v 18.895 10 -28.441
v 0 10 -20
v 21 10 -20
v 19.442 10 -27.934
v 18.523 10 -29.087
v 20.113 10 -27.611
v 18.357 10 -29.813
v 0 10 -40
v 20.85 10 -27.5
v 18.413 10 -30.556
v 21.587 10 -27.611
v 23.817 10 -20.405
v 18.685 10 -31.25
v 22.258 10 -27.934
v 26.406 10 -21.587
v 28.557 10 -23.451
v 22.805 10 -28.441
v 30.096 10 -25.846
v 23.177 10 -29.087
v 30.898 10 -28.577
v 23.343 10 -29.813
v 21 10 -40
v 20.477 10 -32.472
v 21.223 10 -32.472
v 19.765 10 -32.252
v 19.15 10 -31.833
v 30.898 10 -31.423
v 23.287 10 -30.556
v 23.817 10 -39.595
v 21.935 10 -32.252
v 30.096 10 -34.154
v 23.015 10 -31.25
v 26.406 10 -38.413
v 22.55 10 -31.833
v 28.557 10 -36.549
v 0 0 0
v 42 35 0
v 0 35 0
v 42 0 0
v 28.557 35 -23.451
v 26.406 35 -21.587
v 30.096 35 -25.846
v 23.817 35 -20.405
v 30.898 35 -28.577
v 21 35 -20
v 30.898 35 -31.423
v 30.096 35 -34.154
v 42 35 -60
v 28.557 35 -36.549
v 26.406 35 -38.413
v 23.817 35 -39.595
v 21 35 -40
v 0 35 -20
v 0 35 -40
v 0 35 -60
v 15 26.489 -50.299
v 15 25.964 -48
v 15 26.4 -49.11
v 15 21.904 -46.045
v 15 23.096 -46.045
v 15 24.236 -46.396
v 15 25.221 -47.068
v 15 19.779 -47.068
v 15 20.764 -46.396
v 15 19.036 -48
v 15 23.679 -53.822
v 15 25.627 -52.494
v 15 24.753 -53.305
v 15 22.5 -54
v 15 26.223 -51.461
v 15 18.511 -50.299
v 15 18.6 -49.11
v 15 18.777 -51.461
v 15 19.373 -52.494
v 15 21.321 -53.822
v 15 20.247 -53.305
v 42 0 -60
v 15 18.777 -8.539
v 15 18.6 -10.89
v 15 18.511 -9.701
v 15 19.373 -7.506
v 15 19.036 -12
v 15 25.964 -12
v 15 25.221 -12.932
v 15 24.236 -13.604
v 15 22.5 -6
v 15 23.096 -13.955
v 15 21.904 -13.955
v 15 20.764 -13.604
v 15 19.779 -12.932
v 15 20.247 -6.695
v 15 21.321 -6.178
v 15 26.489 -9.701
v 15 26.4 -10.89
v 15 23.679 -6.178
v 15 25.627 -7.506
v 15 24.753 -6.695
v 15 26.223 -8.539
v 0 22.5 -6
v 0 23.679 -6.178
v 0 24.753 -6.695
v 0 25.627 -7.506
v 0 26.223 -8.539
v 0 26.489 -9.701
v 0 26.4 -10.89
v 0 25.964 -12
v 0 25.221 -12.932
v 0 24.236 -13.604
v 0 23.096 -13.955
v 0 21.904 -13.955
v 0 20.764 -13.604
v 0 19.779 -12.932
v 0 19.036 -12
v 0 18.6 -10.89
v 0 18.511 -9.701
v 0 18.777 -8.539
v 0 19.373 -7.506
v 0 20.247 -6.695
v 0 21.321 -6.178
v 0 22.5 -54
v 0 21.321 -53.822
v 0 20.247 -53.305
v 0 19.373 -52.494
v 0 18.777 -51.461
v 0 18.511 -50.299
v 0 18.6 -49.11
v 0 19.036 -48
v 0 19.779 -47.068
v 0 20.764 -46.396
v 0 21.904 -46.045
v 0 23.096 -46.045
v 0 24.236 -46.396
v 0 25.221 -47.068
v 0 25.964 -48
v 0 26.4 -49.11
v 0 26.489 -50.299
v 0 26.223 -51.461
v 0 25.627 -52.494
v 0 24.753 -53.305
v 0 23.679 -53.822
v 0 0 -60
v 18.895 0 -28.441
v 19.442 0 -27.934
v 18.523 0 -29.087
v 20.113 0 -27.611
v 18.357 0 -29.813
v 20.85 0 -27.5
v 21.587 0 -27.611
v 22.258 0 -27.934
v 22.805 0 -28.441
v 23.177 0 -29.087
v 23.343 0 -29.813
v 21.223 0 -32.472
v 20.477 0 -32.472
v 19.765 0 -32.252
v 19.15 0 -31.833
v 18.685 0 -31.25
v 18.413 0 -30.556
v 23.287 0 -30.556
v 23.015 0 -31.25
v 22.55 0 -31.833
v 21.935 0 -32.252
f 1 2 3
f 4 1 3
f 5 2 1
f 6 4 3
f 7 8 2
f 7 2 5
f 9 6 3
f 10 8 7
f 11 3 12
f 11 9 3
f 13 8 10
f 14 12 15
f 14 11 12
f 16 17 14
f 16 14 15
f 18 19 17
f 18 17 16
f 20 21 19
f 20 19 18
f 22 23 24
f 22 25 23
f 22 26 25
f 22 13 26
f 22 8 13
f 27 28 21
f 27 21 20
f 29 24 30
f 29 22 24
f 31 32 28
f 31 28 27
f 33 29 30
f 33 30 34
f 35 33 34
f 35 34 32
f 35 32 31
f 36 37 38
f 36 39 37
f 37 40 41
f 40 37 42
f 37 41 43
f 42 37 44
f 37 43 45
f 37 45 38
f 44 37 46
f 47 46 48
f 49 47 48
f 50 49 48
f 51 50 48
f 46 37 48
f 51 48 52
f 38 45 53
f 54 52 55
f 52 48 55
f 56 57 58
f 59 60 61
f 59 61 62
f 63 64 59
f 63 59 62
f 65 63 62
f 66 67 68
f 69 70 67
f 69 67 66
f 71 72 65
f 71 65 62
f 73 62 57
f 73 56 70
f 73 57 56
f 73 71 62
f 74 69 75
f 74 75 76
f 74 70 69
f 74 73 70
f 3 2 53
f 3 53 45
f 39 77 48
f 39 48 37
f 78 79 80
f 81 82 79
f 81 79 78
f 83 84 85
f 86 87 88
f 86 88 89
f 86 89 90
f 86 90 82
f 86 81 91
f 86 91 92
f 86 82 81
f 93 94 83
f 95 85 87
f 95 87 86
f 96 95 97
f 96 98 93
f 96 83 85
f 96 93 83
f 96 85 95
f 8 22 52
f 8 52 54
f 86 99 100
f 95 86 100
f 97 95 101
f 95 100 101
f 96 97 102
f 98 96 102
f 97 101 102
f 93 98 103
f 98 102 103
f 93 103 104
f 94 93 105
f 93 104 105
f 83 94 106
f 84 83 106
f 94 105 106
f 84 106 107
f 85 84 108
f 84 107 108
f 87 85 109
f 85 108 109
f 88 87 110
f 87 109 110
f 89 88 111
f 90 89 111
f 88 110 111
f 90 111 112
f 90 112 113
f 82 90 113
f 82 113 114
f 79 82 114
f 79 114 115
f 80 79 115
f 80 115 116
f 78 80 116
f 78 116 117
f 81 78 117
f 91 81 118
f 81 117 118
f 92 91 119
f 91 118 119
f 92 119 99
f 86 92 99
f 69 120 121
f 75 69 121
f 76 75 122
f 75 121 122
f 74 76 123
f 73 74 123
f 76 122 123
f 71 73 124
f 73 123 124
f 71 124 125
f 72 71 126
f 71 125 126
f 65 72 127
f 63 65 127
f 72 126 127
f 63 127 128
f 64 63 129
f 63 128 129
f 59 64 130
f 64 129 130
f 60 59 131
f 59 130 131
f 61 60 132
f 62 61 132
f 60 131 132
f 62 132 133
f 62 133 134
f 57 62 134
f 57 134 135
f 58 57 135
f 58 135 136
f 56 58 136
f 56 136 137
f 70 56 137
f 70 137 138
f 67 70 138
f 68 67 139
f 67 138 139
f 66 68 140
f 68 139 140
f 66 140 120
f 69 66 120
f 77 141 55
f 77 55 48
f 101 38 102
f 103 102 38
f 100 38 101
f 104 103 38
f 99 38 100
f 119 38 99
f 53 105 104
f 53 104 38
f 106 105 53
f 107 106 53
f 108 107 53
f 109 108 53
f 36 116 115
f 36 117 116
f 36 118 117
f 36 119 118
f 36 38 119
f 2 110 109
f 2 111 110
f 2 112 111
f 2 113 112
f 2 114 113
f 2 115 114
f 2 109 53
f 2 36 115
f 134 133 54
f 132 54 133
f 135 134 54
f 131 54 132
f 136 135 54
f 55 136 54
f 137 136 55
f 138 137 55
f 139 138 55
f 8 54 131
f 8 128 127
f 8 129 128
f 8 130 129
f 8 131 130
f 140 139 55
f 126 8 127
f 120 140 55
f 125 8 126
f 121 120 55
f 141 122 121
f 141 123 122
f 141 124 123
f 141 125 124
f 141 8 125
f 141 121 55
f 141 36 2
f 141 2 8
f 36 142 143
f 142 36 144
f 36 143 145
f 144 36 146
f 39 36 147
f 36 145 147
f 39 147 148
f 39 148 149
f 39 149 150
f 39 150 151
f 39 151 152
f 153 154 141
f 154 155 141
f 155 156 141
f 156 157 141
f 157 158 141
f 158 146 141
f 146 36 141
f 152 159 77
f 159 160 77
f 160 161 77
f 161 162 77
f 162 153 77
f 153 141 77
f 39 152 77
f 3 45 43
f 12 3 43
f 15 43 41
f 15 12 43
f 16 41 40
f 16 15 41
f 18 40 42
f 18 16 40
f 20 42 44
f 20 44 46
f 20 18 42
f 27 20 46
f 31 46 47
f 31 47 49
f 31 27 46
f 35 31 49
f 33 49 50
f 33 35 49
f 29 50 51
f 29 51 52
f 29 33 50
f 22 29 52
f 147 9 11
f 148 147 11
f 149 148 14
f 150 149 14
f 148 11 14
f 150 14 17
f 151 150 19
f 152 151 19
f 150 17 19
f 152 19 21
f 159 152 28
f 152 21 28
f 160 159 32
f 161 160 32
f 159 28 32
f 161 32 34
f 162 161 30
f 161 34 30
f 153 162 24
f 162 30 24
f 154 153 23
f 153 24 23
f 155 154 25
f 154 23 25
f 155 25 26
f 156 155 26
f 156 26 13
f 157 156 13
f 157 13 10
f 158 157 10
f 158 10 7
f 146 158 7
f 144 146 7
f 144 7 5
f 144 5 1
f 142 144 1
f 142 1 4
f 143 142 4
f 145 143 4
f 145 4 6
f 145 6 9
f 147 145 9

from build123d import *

# Parameters (mm, degrees)
SKETCH1_W           = 42
SKETCH1_H           = 60
BOSS_EXTRUDE1_DEPTH = 10
BOSS_EXTRUDE2_DEPTH = 25
SKETCH3_R           = 4
CUT_EXTRUDE1_DEPTH  = 15
SKETCH4_R           = 2.5
CUT_EXTRUDE2_DEPTH  = 15


with BuildPart() as part:
    # Sketch1 → Boss-Extrude1 (new body)
    with BuildSketch(Plane(origin=(0, 0, 0), x_dir=(1, 0, 0), z_dir=(0, 1, 0))):
        with Locations((21, 30)):
            Rectangle(SKETCH1_W, SKETCH1_H)
    extrude(amount=BOSS_EXTRUDE1_DEPTH)

    # Sketch2 → Boss-Extrude2 (add)
    with BuildSketch(Plane(origin=(0, 10, 0), x_dir=(1, 0, 0), z_dir=(0, 1, 0))):
        with BuildLine():
            Line((0, 20), (21, 20))
            ThreePointArc((21, 20), (31, 30), (21, 40))
            Line((21, 40), (0, 40))
            Line((0, 40), (0, 60))
            Line((0, 60), (42, 60))
            Line((42, 60), (42, 0))
            Line((42, 0), (0, 0))
            Line((0, 0), (0, 20))
        make_face()
    extrude(amount=BOSS_EXTRUDE2_DEPTH)

    # Sketch3 → Cut-Extrude1 (cut)
    with BuildSketch(Plane.ZY):
        with Locations((-10, 22.5)):
            Circle(SKETCH3_R)
        with Locations(Location((-50, 22.5, 0), (0, 0, 180))):
            Circle(SKETCH3_R)
    extrude(amount=-CUT_EXTRUDE1_DEPTH, mode=Mode.SUBTRACT)

    # Sketch4 → Cut-Extrude2 (cut)
    with BuildSketch(Plane(origin=(0, 10, 0), x_dir=(1, 0, 0), z_dir=(0, 1, 0))):
        with Locations(Location((20.85, 30, 0), (0, 0, 270))):
            Circle(SKETCH4_R)
    extrude(amount=-CUT_EXTRUDE2_DEPTH, mode=Mode.SUBTRACT)


solid = part.part
